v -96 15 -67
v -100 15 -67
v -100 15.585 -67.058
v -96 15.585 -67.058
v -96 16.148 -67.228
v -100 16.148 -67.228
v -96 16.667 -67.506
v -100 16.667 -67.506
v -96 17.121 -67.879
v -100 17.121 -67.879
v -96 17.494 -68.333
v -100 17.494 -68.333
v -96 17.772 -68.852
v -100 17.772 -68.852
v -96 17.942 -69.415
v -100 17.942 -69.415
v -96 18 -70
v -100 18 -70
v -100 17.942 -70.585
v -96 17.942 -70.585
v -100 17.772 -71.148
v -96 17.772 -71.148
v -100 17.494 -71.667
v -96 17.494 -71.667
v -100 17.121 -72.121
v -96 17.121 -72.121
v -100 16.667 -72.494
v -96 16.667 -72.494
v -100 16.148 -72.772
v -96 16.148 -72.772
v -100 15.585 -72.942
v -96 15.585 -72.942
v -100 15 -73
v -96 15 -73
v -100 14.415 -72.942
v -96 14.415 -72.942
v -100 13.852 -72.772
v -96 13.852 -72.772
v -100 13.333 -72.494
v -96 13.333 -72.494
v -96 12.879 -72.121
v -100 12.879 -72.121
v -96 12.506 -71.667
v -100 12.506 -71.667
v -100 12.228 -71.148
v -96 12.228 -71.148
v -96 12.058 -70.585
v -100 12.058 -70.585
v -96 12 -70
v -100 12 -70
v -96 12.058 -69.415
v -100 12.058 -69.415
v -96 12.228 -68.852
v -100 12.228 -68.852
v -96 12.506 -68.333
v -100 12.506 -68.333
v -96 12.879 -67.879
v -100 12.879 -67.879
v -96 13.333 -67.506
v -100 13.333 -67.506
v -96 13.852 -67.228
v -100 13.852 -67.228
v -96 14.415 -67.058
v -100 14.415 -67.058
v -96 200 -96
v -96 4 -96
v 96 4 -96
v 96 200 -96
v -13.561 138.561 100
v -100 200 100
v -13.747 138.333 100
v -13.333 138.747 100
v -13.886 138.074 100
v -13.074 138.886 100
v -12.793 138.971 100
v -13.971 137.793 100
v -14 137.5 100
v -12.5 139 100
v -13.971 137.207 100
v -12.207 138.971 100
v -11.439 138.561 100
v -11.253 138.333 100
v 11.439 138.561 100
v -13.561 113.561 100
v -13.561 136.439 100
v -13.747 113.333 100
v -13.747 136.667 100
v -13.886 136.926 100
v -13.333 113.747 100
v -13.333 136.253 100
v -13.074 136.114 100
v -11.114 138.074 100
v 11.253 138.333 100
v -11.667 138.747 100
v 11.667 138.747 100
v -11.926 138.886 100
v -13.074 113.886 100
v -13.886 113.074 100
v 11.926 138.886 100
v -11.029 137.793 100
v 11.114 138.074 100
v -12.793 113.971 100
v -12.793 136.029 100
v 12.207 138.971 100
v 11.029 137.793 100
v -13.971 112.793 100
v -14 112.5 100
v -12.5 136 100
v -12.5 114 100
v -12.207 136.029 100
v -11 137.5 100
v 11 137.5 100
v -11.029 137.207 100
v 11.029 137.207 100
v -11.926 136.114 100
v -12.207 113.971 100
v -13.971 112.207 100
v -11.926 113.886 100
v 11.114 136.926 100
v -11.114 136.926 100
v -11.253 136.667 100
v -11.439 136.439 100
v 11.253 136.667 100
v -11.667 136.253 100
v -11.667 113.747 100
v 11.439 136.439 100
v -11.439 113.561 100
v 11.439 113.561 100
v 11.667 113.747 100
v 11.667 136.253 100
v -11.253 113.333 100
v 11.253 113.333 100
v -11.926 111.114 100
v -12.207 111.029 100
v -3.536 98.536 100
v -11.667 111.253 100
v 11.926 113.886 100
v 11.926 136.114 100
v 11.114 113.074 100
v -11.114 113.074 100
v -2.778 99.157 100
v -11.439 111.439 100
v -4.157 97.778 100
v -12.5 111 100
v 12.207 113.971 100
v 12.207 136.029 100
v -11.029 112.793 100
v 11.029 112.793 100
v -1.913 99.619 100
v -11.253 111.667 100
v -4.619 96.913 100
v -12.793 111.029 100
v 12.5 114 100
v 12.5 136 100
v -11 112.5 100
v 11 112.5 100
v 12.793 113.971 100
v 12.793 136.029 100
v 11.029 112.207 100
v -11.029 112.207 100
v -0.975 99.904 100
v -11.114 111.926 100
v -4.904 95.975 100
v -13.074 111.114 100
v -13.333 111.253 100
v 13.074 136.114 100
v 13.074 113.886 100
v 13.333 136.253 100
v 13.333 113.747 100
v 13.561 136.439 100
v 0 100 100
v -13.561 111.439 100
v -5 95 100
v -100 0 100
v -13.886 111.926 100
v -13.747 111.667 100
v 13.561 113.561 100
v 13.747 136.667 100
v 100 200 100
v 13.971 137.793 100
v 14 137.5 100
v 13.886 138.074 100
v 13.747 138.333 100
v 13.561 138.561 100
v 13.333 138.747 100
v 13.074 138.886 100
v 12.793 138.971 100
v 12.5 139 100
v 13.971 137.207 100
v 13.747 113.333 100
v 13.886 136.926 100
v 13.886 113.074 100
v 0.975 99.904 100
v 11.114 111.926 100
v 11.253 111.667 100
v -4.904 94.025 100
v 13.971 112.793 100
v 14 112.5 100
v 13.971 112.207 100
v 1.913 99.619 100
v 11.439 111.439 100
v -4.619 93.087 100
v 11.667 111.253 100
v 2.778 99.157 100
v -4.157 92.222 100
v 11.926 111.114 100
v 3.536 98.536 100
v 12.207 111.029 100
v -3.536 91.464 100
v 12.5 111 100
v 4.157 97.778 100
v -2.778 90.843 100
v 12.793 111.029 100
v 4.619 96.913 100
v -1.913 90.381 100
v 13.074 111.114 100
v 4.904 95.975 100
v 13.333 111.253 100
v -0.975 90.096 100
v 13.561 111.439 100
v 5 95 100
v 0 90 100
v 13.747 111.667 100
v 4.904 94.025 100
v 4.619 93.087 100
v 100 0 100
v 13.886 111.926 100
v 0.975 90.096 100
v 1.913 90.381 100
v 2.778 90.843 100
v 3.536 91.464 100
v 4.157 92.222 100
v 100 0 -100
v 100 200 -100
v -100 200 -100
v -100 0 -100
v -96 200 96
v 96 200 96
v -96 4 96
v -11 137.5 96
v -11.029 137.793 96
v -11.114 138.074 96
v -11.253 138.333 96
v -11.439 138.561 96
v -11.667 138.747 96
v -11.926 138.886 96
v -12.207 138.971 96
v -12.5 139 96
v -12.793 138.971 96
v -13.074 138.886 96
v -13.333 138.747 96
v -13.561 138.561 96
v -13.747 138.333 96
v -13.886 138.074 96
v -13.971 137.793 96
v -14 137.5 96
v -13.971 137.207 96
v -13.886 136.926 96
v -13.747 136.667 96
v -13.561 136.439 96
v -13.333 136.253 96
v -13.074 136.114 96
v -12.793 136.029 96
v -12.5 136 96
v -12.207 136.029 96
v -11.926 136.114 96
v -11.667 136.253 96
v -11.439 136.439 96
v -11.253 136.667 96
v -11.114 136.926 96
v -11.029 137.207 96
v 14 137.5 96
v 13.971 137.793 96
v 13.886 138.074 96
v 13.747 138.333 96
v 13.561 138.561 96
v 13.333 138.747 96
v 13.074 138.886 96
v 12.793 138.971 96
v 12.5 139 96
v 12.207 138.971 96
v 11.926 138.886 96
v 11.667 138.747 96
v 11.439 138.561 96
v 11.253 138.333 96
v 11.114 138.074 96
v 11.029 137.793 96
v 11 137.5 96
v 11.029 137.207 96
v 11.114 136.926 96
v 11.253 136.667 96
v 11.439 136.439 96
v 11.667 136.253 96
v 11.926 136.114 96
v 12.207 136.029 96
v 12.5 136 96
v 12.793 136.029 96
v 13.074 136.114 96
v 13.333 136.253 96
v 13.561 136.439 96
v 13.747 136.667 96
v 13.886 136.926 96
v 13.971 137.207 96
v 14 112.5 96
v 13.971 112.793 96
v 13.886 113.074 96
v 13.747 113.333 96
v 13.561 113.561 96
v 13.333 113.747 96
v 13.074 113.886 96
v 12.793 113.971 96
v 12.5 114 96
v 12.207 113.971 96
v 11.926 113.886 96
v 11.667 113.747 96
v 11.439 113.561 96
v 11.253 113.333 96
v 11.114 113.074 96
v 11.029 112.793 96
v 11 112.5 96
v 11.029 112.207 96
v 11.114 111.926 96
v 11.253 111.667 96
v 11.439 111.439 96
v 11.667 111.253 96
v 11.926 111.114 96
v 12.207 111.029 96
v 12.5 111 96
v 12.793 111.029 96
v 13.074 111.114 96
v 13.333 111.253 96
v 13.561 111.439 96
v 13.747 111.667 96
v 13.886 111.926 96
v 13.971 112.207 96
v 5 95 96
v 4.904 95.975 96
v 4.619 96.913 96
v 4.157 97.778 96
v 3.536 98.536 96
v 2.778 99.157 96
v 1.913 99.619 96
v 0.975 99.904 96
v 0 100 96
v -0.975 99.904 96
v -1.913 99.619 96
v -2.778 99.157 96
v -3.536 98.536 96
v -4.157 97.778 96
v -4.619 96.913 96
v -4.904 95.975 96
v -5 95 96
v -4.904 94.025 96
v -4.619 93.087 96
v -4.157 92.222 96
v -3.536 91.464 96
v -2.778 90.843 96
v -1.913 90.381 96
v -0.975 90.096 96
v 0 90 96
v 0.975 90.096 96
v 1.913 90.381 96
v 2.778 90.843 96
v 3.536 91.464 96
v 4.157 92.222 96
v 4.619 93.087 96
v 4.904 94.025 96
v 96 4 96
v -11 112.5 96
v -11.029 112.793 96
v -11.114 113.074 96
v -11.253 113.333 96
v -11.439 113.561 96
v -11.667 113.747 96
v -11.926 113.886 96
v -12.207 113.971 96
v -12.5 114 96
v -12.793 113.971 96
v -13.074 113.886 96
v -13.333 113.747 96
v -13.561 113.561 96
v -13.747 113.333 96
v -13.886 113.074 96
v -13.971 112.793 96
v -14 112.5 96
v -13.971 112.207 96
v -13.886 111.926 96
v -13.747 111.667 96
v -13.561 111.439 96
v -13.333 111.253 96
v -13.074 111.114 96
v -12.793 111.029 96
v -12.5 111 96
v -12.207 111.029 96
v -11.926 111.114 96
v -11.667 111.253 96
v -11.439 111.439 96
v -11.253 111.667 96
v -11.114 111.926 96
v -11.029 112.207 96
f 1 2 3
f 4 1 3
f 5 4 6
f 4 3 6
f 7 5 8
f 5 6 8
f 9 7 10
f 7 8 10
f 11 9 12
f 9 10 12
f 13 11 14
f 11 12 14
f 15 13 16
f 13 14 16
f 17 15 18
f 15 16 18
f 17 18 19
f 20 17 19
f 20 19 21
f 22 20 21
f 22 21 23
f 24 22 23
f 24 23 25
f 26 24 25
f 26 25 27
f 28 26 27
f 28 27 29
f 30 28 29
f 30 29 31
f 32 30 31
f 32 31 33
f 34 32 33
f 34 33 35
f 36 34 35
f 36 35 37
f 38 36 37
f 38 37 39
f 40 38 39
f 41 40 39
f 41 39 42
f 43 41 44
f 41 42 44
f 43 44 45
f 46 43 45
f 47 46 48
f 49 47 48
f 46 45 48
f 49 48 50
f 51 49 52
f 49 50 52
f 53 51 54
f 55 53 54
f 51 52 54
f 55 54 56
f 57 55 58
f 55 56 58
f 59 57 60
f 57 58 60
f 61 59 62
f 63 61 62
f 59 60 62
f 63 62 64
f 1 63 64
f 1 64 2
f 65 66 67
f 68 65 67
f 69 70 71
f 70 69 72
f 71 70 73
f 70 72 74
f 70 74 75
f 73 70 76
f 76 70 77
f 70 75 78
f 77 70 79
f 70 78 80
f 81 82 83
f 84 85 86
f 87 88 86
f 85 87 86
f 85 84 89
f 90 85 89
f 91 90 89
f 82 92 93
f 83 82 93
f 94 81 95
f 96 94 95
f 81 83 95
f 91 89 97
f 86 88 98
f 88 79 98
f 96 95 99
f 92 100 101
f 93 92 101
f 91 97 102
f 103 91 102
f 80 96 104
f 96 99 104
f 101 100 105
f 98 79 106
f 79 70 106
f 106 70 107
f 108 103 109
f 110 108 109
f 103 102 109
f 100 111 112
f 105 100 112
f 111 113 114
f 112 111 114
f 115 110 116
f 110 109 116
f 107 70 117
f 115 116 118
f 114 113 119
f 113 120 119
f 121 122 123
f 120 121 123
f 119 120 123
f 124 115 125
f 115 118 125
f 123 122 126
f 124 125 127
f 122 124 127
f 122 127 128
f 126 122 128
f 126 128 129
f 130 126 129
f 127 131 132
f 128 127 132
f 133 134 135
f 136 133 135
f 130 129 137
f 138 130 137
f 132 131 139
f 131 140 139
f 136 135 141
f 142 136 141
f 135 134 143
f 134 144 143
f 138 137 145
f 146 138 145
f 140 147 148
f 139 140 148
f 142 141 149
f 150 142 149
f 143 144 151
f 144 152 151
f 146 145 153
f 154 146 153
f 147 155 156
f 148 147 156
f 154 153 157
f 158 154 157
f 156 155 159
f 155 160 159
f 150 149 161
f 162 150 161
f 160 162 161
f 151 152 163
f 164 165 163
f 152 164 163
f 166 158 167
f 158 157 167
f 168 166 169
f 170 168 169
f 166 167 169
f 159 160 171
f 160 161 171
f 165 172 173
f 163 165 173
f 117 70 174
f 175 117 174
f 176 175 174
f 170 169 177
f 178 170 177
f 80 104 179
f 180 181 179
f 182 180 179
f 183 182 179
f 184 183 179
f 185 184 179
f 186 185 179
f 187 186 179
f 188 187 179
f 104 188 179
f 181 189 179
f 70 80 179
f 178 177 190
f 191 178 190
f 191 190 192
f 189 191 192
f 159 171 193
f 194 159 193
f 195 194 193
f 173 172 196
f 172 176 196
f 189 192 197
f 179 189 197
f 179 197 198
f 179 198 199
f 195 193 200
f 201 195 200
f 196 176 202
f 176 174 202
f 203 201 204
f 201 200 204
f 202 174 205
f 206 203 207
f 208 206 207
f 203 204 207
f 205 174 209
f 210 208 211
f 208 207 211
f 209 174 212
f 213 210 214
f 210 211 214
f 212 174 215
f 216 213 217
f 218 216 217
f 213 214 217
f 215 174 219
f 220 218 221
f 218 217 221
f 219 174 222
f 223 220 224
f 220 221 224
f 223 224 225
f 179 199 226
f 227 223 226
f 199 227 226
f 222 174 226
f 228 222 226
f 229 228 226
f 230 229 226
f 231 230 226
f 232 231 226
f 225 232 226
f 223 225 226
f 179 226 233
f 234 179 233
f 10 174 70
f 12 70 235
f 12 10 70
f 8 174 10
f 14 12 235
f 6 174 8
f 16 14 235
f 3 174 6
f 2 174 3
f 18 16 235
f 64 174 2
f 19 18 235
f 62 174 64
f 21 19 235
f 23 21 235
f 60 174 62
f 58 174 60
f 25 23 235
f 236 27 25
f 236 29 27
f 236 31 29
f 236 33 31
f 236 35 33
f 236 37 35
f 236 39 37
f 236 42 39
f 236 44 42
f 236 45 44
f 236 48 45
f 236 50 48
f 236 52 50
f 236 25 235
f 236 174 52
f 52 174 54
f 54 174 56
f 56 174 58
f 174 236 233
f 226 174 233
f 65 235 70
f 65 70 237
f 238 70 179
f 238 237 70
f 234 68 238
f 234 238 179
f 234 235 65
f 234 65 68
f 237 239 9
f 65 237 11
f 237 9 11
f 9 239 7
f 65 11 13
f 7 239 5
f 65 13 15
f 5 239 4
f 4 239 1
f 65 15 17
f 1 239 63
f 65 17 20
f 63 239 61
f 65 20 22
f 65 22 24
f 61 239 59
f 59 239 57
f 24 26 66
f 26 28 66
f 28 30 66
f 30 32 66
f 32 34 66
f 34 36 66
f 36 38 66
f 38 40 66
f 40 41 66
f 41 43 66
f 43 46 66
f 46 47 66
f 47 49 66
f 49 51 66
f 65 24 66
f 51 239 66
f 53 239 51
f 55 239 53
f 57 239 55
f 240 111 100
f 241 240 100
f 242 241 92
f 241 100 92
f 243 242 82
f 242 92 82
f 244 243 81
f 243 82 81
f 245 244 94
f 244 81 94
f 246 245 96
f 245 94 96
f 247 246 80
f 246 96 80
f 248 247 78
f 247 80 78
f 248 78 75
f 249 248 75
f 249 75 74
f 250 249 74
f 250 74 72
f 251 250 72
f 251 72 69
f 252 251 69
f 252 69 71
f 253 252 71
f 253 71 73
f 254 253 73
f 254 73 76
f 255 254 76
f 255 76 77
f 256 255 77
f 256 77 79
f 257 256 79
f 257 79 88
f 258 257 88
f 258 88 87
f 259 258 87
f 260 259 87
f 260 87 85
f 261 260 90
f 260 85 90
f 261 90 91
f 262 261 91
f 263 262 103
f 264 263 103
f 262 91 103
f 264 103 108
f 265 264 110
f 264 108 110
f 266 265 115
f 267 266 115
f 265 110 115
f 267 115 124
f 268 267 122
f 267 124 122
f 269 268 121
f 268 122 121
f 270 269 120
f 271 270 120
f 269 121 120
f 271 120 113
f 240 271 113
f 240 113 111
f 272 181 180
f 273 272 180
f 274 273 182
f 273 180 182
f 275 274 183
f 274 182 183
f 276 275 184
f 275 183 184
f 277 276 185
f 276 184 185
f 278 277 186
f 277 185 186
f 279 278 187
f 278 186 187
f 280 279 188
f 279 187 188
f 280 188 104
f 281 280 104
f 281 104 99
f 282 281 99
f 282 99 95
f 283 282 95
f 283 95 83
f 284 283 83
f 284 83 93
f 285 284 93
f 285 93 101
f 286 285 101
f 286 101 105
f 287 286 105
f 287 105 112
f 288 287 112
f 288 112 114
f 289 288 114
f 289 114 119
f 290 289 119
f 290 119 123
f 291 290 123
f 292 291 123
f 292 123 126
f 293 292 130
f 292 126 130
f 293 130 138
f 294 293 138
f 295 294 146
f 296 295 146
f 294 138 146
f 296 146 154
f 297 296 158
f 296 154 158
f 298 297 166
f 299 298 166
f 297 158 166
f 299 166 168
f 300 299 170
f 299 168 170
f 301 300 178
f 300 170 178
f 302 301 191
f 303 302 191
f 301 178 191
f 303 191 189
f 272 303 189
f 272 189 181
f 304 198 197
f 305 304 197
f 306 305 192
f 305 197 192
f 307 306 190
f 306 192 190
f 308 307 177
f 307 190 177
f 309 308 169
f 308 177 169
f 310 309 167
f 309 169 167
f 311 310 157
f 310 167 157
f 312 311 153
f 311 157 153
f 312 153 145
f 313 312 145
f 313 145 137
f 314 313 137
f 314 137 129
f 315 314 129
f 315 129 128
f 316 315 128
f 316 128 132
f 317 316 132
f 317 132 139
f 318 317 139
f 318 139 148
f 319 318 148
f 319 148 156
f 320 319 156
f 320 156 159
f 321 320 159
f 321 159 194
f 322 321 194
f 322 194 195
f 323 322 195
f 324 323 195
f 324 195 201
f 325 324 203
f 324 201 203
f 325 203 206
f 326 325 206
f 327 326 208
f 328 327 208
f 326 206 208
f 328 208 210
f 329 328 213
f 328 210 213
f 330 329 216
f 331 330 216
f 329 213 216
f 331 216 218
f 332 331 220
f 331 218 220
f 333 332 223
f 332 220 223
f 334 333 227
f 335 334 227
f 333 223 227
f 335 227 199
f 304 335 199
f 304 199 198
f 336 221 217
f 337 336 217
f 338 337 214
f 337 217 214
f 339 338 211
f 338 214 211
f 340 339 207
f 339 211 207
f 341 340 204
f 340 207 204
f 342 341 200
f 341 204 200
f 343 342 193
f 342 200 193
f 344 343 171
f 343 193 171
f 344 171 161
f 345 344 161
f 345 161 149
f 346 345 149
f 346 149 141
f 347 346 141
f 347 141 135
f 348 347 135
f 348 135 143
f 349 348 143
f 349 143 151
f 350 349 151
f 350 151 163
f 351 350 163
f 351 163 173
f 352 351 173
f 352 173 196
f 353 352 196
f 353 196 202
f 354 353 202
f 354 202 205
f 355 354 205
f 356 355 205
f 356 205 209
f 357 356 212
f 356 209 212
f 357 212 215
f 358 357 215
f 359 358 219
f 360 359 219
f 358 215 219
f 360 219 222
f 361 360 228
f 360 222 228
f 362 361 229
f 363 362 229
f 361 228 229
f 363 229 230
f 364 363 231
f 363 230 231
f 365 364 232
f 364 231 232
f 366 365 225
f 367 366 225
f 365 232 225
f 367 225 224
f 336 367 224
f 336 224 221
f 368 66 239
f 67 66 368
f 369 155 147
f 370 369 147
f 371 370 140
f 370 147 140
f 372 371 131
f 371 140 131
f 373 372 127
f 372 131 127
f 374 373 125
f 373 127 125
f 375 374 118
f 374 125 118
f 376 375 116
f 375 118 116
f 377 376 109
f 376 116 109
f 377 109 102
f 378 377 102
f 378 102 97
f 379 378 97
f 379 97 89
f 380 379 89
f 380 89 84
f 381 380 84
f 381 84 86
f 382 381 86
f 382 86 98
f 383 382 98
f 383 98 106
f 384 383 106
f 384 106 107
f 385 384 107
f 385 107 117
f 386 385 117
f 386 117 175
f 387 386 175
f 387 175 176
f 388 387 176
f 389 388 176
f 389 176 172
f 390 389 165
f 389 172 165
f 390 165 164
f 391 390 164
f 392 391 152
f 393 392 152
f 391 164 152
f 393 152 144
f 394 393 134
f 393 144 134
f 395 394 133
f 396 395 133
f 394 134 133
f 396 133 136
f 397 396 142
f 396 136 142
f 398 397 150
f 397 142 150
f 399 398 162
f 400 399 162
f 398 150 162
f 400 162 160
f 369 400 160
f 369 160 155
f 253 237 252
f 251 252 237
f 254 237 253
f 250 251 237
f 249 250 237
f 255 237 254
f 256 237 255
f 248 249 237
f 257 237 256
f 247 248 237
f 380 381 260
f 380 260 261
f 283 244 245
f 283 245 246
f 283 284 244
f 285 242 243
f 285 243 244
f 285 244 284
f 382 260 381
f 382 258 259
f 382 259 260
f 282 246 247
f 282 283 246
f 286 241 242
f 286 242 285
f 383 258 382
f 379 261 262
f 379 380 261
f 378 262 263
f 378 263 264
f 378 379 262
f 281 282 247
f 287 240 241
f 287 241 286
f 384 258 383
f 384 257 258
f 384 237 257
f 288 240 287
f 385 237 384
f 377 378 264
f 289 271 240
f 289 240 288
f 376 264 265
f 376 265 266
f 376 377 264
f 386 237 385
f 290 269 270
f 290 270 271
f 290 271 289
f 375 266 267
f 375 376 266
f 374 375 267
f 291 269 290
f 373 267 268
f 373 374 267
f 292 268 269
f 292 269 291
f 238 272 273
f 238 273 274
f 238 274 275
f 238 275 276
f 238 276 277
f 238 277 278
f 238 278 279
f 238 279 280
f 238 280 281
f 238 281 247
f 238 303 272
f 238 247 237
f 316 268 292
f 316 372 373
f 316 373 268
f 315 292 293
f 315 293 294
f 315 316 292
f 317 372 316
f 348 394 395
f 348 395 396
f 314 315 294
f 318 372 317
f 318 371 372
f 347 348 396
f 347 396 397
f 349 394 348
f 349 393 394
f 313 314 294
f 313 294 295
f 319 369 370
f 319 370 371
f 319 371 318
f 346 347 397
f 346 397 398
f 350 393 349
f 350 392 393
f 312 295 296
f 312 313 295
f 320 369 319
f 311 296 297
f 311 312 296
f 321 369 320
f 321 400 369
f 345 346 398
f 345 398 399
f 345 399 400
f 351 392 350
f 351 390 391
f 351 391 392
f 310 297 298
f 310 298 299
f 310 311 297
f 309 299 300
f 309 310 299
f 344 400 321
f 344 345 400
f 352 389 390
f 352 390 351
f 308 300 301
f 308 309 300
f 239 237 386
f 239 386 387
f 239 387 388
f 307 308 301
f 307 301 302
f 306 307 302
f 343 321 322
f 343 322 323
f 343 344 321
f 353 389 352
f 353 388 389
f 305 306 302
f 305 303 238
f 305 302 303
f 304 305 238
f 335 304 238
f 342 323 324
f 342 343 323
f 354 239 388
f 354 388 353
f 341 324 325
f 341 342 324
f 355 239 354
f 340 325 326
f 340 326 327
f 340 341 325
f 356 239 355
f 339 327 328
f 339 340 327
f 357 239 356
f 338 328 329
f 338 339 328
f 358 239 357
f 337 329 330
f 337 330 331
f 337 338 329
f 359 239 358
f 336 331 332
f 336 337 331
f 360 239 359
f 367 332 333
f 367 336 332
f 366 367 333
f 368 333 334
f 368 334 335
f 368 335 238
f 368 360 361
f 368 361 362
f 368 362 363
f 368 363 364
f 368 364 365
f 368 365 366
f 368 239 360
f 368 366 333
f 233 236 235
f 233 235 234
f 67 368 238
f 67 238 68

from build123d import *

# Parameters (mm, degrees)
SKETCH1_W           = 200
SKETCH1_H           = 200
BOSS_EXTRUDE1_DEPTH = 200
SHELL1_T            = -4
CUT_EXTRUDE1_REACH  = 302
SKETCH2_R           = 1.5
SKETCH2_R_2         = 5
CUT_EXTRUDE2_REACH  = 302
SKETCH3_R           = 3


with BuildPart() as part:
    # Sketch1 → Boss-Extrude1 (new body)
    with BuildSketch(Plane(origin=(0, 0, 0), x_dir=(1, 0, 0), z_dir=(0, 1, 0))):
        Rectangle(SKETCH1_W, SKETCH1_H)
    extrude(amount=BOSS_EXTRUDE1_DEPTH)

    # Shell1
    shell1_openings = [part.faces().sort_by_distance(p)[0] for p in [
        (0, 200, 0),
    ]]
    offset(amount=SHELL1_T, openings=shell1_openings, kind=Kind.INTERSECTION)

    # Sketch2 → Cut-Extrude1 (cut, up to next)
    with BuildSketch(Plane.XY.offset(100), mode=Mode.PRIVATE) as cut_extrude1_sk1:
        with Locations((-12.5, 137.5)):
            Circle(SKETCH2_R)
    cut_extrude1_tool1 = extrude(cut_extrude1_sk1.sketch, amount=-CUT_EXTRUDE1_REACH, mode=Mode.PRIVATE) & part.part
    # Sketch2 → Cut-Extrude1 (cut, up to next)
    with BuildSketch(Plane.XY.offset(100), mode=Mode.PRIVATE) as cut_extrude1_sk2:
        with Locations((12.5, 137.5)):
            Circle(SKETCH2_R)
    cut_extrude1_tool2 = extrude(cut_extrude1_sk2.sketch, amount=-CUT_EXTRUDE1_REACH, mode=Mode.PRIVATE) & part.part
    # Sketch2 → Cut-Extrude1 (cut, up to next)
    with BuildSketch(Plane.XY.offset(100), mode=Mode.PRIVATE) as cut_extrude1_sk3:
        with Locations((12.5, 112.5)):
            Circle(SKETCH2_R)
    cut_extrude1_tool3 = extrude(cut_extrude1_sk3.sketch, amount=-CUT_EXTRUDE1_REACH, mode=Mode.PRIVATE) & part.part
    # Sketch2 → Cut-Extrude1 (cut, up to next)
    with BuildSketch(Plane.XY.offset(100), mode=Mode.PRIVATE) as cut_extrude1_sk4:
        with Locations((-12.5, 112.5)):
            Circle(SKETCH2_R)
    cut_extrude1_tool4 = extrude(cut_extrude1_sk4.sketch, amount=-CUT_EXTRUDE1_REACH, mode=Mode.PRIVATE) & part.part
    # Sketch2 → Cut-Extrude1 (cut, up to next)
    with BuildSketch(Plane.XY.offset(100), mode=Mode.PRIVATE) as cut_extrude1_sk5:
        with Locations((0, 95)):
            Circle(SKETCH2_R_2)
    cut_extrude1_tool5 = extrude(cut_extrude1_sk5.sketch, amount=-CUT_EXTRUDE1_REACH, mode=Mode.PRIVATE) & part.part
    add(cut_extrude1_tool1.solids().sort_by_distance((-12.5, 137.5, 100))[0], mode=Mode.SUBTRACT)
    add(cut_extrude1_tool2.solids().sort_by_distance((12.5, 137.5, 100))[0], mode=Mode.SUBTRACT)
    add(cut_extrude1_tool3.solids().sort_by_distance((12.5, 112.5, 100))[0], mode=Mode.SUBTRACT)
    add(cut_extrude1_tool4.solids().sort_by_distance((-12.5, 112.5, 100))[0], mode=Mode.SUBTRACT)
    add(cut_extrude1_tool5.solids().sort_by_distance((0, 95, 100))[0], mode=Mode.SUBTRACT)

    # Sketch3 → Cut-Extrude2 (cut, up to next)
    with BuildSketch(Plane.ZY.offset(100), mode=Mode.PRIVATE) as cut_extrude2_sk1:
        with Locations((-70, 15)):
            Circle(SKETCH3_R)
    cut_extrude2_tool1 = extrude(cut_extrude2_sk1.sketch, amount=-CUT_EXTRUDE2_REACH, mode=Mode.PRIVATE) & part.part
    add(cut_extrude2_tool1.solids().sort_by_distance((-100, 15, -70))[0], mode=Mode.SUBTRACT)


solid = part.part
